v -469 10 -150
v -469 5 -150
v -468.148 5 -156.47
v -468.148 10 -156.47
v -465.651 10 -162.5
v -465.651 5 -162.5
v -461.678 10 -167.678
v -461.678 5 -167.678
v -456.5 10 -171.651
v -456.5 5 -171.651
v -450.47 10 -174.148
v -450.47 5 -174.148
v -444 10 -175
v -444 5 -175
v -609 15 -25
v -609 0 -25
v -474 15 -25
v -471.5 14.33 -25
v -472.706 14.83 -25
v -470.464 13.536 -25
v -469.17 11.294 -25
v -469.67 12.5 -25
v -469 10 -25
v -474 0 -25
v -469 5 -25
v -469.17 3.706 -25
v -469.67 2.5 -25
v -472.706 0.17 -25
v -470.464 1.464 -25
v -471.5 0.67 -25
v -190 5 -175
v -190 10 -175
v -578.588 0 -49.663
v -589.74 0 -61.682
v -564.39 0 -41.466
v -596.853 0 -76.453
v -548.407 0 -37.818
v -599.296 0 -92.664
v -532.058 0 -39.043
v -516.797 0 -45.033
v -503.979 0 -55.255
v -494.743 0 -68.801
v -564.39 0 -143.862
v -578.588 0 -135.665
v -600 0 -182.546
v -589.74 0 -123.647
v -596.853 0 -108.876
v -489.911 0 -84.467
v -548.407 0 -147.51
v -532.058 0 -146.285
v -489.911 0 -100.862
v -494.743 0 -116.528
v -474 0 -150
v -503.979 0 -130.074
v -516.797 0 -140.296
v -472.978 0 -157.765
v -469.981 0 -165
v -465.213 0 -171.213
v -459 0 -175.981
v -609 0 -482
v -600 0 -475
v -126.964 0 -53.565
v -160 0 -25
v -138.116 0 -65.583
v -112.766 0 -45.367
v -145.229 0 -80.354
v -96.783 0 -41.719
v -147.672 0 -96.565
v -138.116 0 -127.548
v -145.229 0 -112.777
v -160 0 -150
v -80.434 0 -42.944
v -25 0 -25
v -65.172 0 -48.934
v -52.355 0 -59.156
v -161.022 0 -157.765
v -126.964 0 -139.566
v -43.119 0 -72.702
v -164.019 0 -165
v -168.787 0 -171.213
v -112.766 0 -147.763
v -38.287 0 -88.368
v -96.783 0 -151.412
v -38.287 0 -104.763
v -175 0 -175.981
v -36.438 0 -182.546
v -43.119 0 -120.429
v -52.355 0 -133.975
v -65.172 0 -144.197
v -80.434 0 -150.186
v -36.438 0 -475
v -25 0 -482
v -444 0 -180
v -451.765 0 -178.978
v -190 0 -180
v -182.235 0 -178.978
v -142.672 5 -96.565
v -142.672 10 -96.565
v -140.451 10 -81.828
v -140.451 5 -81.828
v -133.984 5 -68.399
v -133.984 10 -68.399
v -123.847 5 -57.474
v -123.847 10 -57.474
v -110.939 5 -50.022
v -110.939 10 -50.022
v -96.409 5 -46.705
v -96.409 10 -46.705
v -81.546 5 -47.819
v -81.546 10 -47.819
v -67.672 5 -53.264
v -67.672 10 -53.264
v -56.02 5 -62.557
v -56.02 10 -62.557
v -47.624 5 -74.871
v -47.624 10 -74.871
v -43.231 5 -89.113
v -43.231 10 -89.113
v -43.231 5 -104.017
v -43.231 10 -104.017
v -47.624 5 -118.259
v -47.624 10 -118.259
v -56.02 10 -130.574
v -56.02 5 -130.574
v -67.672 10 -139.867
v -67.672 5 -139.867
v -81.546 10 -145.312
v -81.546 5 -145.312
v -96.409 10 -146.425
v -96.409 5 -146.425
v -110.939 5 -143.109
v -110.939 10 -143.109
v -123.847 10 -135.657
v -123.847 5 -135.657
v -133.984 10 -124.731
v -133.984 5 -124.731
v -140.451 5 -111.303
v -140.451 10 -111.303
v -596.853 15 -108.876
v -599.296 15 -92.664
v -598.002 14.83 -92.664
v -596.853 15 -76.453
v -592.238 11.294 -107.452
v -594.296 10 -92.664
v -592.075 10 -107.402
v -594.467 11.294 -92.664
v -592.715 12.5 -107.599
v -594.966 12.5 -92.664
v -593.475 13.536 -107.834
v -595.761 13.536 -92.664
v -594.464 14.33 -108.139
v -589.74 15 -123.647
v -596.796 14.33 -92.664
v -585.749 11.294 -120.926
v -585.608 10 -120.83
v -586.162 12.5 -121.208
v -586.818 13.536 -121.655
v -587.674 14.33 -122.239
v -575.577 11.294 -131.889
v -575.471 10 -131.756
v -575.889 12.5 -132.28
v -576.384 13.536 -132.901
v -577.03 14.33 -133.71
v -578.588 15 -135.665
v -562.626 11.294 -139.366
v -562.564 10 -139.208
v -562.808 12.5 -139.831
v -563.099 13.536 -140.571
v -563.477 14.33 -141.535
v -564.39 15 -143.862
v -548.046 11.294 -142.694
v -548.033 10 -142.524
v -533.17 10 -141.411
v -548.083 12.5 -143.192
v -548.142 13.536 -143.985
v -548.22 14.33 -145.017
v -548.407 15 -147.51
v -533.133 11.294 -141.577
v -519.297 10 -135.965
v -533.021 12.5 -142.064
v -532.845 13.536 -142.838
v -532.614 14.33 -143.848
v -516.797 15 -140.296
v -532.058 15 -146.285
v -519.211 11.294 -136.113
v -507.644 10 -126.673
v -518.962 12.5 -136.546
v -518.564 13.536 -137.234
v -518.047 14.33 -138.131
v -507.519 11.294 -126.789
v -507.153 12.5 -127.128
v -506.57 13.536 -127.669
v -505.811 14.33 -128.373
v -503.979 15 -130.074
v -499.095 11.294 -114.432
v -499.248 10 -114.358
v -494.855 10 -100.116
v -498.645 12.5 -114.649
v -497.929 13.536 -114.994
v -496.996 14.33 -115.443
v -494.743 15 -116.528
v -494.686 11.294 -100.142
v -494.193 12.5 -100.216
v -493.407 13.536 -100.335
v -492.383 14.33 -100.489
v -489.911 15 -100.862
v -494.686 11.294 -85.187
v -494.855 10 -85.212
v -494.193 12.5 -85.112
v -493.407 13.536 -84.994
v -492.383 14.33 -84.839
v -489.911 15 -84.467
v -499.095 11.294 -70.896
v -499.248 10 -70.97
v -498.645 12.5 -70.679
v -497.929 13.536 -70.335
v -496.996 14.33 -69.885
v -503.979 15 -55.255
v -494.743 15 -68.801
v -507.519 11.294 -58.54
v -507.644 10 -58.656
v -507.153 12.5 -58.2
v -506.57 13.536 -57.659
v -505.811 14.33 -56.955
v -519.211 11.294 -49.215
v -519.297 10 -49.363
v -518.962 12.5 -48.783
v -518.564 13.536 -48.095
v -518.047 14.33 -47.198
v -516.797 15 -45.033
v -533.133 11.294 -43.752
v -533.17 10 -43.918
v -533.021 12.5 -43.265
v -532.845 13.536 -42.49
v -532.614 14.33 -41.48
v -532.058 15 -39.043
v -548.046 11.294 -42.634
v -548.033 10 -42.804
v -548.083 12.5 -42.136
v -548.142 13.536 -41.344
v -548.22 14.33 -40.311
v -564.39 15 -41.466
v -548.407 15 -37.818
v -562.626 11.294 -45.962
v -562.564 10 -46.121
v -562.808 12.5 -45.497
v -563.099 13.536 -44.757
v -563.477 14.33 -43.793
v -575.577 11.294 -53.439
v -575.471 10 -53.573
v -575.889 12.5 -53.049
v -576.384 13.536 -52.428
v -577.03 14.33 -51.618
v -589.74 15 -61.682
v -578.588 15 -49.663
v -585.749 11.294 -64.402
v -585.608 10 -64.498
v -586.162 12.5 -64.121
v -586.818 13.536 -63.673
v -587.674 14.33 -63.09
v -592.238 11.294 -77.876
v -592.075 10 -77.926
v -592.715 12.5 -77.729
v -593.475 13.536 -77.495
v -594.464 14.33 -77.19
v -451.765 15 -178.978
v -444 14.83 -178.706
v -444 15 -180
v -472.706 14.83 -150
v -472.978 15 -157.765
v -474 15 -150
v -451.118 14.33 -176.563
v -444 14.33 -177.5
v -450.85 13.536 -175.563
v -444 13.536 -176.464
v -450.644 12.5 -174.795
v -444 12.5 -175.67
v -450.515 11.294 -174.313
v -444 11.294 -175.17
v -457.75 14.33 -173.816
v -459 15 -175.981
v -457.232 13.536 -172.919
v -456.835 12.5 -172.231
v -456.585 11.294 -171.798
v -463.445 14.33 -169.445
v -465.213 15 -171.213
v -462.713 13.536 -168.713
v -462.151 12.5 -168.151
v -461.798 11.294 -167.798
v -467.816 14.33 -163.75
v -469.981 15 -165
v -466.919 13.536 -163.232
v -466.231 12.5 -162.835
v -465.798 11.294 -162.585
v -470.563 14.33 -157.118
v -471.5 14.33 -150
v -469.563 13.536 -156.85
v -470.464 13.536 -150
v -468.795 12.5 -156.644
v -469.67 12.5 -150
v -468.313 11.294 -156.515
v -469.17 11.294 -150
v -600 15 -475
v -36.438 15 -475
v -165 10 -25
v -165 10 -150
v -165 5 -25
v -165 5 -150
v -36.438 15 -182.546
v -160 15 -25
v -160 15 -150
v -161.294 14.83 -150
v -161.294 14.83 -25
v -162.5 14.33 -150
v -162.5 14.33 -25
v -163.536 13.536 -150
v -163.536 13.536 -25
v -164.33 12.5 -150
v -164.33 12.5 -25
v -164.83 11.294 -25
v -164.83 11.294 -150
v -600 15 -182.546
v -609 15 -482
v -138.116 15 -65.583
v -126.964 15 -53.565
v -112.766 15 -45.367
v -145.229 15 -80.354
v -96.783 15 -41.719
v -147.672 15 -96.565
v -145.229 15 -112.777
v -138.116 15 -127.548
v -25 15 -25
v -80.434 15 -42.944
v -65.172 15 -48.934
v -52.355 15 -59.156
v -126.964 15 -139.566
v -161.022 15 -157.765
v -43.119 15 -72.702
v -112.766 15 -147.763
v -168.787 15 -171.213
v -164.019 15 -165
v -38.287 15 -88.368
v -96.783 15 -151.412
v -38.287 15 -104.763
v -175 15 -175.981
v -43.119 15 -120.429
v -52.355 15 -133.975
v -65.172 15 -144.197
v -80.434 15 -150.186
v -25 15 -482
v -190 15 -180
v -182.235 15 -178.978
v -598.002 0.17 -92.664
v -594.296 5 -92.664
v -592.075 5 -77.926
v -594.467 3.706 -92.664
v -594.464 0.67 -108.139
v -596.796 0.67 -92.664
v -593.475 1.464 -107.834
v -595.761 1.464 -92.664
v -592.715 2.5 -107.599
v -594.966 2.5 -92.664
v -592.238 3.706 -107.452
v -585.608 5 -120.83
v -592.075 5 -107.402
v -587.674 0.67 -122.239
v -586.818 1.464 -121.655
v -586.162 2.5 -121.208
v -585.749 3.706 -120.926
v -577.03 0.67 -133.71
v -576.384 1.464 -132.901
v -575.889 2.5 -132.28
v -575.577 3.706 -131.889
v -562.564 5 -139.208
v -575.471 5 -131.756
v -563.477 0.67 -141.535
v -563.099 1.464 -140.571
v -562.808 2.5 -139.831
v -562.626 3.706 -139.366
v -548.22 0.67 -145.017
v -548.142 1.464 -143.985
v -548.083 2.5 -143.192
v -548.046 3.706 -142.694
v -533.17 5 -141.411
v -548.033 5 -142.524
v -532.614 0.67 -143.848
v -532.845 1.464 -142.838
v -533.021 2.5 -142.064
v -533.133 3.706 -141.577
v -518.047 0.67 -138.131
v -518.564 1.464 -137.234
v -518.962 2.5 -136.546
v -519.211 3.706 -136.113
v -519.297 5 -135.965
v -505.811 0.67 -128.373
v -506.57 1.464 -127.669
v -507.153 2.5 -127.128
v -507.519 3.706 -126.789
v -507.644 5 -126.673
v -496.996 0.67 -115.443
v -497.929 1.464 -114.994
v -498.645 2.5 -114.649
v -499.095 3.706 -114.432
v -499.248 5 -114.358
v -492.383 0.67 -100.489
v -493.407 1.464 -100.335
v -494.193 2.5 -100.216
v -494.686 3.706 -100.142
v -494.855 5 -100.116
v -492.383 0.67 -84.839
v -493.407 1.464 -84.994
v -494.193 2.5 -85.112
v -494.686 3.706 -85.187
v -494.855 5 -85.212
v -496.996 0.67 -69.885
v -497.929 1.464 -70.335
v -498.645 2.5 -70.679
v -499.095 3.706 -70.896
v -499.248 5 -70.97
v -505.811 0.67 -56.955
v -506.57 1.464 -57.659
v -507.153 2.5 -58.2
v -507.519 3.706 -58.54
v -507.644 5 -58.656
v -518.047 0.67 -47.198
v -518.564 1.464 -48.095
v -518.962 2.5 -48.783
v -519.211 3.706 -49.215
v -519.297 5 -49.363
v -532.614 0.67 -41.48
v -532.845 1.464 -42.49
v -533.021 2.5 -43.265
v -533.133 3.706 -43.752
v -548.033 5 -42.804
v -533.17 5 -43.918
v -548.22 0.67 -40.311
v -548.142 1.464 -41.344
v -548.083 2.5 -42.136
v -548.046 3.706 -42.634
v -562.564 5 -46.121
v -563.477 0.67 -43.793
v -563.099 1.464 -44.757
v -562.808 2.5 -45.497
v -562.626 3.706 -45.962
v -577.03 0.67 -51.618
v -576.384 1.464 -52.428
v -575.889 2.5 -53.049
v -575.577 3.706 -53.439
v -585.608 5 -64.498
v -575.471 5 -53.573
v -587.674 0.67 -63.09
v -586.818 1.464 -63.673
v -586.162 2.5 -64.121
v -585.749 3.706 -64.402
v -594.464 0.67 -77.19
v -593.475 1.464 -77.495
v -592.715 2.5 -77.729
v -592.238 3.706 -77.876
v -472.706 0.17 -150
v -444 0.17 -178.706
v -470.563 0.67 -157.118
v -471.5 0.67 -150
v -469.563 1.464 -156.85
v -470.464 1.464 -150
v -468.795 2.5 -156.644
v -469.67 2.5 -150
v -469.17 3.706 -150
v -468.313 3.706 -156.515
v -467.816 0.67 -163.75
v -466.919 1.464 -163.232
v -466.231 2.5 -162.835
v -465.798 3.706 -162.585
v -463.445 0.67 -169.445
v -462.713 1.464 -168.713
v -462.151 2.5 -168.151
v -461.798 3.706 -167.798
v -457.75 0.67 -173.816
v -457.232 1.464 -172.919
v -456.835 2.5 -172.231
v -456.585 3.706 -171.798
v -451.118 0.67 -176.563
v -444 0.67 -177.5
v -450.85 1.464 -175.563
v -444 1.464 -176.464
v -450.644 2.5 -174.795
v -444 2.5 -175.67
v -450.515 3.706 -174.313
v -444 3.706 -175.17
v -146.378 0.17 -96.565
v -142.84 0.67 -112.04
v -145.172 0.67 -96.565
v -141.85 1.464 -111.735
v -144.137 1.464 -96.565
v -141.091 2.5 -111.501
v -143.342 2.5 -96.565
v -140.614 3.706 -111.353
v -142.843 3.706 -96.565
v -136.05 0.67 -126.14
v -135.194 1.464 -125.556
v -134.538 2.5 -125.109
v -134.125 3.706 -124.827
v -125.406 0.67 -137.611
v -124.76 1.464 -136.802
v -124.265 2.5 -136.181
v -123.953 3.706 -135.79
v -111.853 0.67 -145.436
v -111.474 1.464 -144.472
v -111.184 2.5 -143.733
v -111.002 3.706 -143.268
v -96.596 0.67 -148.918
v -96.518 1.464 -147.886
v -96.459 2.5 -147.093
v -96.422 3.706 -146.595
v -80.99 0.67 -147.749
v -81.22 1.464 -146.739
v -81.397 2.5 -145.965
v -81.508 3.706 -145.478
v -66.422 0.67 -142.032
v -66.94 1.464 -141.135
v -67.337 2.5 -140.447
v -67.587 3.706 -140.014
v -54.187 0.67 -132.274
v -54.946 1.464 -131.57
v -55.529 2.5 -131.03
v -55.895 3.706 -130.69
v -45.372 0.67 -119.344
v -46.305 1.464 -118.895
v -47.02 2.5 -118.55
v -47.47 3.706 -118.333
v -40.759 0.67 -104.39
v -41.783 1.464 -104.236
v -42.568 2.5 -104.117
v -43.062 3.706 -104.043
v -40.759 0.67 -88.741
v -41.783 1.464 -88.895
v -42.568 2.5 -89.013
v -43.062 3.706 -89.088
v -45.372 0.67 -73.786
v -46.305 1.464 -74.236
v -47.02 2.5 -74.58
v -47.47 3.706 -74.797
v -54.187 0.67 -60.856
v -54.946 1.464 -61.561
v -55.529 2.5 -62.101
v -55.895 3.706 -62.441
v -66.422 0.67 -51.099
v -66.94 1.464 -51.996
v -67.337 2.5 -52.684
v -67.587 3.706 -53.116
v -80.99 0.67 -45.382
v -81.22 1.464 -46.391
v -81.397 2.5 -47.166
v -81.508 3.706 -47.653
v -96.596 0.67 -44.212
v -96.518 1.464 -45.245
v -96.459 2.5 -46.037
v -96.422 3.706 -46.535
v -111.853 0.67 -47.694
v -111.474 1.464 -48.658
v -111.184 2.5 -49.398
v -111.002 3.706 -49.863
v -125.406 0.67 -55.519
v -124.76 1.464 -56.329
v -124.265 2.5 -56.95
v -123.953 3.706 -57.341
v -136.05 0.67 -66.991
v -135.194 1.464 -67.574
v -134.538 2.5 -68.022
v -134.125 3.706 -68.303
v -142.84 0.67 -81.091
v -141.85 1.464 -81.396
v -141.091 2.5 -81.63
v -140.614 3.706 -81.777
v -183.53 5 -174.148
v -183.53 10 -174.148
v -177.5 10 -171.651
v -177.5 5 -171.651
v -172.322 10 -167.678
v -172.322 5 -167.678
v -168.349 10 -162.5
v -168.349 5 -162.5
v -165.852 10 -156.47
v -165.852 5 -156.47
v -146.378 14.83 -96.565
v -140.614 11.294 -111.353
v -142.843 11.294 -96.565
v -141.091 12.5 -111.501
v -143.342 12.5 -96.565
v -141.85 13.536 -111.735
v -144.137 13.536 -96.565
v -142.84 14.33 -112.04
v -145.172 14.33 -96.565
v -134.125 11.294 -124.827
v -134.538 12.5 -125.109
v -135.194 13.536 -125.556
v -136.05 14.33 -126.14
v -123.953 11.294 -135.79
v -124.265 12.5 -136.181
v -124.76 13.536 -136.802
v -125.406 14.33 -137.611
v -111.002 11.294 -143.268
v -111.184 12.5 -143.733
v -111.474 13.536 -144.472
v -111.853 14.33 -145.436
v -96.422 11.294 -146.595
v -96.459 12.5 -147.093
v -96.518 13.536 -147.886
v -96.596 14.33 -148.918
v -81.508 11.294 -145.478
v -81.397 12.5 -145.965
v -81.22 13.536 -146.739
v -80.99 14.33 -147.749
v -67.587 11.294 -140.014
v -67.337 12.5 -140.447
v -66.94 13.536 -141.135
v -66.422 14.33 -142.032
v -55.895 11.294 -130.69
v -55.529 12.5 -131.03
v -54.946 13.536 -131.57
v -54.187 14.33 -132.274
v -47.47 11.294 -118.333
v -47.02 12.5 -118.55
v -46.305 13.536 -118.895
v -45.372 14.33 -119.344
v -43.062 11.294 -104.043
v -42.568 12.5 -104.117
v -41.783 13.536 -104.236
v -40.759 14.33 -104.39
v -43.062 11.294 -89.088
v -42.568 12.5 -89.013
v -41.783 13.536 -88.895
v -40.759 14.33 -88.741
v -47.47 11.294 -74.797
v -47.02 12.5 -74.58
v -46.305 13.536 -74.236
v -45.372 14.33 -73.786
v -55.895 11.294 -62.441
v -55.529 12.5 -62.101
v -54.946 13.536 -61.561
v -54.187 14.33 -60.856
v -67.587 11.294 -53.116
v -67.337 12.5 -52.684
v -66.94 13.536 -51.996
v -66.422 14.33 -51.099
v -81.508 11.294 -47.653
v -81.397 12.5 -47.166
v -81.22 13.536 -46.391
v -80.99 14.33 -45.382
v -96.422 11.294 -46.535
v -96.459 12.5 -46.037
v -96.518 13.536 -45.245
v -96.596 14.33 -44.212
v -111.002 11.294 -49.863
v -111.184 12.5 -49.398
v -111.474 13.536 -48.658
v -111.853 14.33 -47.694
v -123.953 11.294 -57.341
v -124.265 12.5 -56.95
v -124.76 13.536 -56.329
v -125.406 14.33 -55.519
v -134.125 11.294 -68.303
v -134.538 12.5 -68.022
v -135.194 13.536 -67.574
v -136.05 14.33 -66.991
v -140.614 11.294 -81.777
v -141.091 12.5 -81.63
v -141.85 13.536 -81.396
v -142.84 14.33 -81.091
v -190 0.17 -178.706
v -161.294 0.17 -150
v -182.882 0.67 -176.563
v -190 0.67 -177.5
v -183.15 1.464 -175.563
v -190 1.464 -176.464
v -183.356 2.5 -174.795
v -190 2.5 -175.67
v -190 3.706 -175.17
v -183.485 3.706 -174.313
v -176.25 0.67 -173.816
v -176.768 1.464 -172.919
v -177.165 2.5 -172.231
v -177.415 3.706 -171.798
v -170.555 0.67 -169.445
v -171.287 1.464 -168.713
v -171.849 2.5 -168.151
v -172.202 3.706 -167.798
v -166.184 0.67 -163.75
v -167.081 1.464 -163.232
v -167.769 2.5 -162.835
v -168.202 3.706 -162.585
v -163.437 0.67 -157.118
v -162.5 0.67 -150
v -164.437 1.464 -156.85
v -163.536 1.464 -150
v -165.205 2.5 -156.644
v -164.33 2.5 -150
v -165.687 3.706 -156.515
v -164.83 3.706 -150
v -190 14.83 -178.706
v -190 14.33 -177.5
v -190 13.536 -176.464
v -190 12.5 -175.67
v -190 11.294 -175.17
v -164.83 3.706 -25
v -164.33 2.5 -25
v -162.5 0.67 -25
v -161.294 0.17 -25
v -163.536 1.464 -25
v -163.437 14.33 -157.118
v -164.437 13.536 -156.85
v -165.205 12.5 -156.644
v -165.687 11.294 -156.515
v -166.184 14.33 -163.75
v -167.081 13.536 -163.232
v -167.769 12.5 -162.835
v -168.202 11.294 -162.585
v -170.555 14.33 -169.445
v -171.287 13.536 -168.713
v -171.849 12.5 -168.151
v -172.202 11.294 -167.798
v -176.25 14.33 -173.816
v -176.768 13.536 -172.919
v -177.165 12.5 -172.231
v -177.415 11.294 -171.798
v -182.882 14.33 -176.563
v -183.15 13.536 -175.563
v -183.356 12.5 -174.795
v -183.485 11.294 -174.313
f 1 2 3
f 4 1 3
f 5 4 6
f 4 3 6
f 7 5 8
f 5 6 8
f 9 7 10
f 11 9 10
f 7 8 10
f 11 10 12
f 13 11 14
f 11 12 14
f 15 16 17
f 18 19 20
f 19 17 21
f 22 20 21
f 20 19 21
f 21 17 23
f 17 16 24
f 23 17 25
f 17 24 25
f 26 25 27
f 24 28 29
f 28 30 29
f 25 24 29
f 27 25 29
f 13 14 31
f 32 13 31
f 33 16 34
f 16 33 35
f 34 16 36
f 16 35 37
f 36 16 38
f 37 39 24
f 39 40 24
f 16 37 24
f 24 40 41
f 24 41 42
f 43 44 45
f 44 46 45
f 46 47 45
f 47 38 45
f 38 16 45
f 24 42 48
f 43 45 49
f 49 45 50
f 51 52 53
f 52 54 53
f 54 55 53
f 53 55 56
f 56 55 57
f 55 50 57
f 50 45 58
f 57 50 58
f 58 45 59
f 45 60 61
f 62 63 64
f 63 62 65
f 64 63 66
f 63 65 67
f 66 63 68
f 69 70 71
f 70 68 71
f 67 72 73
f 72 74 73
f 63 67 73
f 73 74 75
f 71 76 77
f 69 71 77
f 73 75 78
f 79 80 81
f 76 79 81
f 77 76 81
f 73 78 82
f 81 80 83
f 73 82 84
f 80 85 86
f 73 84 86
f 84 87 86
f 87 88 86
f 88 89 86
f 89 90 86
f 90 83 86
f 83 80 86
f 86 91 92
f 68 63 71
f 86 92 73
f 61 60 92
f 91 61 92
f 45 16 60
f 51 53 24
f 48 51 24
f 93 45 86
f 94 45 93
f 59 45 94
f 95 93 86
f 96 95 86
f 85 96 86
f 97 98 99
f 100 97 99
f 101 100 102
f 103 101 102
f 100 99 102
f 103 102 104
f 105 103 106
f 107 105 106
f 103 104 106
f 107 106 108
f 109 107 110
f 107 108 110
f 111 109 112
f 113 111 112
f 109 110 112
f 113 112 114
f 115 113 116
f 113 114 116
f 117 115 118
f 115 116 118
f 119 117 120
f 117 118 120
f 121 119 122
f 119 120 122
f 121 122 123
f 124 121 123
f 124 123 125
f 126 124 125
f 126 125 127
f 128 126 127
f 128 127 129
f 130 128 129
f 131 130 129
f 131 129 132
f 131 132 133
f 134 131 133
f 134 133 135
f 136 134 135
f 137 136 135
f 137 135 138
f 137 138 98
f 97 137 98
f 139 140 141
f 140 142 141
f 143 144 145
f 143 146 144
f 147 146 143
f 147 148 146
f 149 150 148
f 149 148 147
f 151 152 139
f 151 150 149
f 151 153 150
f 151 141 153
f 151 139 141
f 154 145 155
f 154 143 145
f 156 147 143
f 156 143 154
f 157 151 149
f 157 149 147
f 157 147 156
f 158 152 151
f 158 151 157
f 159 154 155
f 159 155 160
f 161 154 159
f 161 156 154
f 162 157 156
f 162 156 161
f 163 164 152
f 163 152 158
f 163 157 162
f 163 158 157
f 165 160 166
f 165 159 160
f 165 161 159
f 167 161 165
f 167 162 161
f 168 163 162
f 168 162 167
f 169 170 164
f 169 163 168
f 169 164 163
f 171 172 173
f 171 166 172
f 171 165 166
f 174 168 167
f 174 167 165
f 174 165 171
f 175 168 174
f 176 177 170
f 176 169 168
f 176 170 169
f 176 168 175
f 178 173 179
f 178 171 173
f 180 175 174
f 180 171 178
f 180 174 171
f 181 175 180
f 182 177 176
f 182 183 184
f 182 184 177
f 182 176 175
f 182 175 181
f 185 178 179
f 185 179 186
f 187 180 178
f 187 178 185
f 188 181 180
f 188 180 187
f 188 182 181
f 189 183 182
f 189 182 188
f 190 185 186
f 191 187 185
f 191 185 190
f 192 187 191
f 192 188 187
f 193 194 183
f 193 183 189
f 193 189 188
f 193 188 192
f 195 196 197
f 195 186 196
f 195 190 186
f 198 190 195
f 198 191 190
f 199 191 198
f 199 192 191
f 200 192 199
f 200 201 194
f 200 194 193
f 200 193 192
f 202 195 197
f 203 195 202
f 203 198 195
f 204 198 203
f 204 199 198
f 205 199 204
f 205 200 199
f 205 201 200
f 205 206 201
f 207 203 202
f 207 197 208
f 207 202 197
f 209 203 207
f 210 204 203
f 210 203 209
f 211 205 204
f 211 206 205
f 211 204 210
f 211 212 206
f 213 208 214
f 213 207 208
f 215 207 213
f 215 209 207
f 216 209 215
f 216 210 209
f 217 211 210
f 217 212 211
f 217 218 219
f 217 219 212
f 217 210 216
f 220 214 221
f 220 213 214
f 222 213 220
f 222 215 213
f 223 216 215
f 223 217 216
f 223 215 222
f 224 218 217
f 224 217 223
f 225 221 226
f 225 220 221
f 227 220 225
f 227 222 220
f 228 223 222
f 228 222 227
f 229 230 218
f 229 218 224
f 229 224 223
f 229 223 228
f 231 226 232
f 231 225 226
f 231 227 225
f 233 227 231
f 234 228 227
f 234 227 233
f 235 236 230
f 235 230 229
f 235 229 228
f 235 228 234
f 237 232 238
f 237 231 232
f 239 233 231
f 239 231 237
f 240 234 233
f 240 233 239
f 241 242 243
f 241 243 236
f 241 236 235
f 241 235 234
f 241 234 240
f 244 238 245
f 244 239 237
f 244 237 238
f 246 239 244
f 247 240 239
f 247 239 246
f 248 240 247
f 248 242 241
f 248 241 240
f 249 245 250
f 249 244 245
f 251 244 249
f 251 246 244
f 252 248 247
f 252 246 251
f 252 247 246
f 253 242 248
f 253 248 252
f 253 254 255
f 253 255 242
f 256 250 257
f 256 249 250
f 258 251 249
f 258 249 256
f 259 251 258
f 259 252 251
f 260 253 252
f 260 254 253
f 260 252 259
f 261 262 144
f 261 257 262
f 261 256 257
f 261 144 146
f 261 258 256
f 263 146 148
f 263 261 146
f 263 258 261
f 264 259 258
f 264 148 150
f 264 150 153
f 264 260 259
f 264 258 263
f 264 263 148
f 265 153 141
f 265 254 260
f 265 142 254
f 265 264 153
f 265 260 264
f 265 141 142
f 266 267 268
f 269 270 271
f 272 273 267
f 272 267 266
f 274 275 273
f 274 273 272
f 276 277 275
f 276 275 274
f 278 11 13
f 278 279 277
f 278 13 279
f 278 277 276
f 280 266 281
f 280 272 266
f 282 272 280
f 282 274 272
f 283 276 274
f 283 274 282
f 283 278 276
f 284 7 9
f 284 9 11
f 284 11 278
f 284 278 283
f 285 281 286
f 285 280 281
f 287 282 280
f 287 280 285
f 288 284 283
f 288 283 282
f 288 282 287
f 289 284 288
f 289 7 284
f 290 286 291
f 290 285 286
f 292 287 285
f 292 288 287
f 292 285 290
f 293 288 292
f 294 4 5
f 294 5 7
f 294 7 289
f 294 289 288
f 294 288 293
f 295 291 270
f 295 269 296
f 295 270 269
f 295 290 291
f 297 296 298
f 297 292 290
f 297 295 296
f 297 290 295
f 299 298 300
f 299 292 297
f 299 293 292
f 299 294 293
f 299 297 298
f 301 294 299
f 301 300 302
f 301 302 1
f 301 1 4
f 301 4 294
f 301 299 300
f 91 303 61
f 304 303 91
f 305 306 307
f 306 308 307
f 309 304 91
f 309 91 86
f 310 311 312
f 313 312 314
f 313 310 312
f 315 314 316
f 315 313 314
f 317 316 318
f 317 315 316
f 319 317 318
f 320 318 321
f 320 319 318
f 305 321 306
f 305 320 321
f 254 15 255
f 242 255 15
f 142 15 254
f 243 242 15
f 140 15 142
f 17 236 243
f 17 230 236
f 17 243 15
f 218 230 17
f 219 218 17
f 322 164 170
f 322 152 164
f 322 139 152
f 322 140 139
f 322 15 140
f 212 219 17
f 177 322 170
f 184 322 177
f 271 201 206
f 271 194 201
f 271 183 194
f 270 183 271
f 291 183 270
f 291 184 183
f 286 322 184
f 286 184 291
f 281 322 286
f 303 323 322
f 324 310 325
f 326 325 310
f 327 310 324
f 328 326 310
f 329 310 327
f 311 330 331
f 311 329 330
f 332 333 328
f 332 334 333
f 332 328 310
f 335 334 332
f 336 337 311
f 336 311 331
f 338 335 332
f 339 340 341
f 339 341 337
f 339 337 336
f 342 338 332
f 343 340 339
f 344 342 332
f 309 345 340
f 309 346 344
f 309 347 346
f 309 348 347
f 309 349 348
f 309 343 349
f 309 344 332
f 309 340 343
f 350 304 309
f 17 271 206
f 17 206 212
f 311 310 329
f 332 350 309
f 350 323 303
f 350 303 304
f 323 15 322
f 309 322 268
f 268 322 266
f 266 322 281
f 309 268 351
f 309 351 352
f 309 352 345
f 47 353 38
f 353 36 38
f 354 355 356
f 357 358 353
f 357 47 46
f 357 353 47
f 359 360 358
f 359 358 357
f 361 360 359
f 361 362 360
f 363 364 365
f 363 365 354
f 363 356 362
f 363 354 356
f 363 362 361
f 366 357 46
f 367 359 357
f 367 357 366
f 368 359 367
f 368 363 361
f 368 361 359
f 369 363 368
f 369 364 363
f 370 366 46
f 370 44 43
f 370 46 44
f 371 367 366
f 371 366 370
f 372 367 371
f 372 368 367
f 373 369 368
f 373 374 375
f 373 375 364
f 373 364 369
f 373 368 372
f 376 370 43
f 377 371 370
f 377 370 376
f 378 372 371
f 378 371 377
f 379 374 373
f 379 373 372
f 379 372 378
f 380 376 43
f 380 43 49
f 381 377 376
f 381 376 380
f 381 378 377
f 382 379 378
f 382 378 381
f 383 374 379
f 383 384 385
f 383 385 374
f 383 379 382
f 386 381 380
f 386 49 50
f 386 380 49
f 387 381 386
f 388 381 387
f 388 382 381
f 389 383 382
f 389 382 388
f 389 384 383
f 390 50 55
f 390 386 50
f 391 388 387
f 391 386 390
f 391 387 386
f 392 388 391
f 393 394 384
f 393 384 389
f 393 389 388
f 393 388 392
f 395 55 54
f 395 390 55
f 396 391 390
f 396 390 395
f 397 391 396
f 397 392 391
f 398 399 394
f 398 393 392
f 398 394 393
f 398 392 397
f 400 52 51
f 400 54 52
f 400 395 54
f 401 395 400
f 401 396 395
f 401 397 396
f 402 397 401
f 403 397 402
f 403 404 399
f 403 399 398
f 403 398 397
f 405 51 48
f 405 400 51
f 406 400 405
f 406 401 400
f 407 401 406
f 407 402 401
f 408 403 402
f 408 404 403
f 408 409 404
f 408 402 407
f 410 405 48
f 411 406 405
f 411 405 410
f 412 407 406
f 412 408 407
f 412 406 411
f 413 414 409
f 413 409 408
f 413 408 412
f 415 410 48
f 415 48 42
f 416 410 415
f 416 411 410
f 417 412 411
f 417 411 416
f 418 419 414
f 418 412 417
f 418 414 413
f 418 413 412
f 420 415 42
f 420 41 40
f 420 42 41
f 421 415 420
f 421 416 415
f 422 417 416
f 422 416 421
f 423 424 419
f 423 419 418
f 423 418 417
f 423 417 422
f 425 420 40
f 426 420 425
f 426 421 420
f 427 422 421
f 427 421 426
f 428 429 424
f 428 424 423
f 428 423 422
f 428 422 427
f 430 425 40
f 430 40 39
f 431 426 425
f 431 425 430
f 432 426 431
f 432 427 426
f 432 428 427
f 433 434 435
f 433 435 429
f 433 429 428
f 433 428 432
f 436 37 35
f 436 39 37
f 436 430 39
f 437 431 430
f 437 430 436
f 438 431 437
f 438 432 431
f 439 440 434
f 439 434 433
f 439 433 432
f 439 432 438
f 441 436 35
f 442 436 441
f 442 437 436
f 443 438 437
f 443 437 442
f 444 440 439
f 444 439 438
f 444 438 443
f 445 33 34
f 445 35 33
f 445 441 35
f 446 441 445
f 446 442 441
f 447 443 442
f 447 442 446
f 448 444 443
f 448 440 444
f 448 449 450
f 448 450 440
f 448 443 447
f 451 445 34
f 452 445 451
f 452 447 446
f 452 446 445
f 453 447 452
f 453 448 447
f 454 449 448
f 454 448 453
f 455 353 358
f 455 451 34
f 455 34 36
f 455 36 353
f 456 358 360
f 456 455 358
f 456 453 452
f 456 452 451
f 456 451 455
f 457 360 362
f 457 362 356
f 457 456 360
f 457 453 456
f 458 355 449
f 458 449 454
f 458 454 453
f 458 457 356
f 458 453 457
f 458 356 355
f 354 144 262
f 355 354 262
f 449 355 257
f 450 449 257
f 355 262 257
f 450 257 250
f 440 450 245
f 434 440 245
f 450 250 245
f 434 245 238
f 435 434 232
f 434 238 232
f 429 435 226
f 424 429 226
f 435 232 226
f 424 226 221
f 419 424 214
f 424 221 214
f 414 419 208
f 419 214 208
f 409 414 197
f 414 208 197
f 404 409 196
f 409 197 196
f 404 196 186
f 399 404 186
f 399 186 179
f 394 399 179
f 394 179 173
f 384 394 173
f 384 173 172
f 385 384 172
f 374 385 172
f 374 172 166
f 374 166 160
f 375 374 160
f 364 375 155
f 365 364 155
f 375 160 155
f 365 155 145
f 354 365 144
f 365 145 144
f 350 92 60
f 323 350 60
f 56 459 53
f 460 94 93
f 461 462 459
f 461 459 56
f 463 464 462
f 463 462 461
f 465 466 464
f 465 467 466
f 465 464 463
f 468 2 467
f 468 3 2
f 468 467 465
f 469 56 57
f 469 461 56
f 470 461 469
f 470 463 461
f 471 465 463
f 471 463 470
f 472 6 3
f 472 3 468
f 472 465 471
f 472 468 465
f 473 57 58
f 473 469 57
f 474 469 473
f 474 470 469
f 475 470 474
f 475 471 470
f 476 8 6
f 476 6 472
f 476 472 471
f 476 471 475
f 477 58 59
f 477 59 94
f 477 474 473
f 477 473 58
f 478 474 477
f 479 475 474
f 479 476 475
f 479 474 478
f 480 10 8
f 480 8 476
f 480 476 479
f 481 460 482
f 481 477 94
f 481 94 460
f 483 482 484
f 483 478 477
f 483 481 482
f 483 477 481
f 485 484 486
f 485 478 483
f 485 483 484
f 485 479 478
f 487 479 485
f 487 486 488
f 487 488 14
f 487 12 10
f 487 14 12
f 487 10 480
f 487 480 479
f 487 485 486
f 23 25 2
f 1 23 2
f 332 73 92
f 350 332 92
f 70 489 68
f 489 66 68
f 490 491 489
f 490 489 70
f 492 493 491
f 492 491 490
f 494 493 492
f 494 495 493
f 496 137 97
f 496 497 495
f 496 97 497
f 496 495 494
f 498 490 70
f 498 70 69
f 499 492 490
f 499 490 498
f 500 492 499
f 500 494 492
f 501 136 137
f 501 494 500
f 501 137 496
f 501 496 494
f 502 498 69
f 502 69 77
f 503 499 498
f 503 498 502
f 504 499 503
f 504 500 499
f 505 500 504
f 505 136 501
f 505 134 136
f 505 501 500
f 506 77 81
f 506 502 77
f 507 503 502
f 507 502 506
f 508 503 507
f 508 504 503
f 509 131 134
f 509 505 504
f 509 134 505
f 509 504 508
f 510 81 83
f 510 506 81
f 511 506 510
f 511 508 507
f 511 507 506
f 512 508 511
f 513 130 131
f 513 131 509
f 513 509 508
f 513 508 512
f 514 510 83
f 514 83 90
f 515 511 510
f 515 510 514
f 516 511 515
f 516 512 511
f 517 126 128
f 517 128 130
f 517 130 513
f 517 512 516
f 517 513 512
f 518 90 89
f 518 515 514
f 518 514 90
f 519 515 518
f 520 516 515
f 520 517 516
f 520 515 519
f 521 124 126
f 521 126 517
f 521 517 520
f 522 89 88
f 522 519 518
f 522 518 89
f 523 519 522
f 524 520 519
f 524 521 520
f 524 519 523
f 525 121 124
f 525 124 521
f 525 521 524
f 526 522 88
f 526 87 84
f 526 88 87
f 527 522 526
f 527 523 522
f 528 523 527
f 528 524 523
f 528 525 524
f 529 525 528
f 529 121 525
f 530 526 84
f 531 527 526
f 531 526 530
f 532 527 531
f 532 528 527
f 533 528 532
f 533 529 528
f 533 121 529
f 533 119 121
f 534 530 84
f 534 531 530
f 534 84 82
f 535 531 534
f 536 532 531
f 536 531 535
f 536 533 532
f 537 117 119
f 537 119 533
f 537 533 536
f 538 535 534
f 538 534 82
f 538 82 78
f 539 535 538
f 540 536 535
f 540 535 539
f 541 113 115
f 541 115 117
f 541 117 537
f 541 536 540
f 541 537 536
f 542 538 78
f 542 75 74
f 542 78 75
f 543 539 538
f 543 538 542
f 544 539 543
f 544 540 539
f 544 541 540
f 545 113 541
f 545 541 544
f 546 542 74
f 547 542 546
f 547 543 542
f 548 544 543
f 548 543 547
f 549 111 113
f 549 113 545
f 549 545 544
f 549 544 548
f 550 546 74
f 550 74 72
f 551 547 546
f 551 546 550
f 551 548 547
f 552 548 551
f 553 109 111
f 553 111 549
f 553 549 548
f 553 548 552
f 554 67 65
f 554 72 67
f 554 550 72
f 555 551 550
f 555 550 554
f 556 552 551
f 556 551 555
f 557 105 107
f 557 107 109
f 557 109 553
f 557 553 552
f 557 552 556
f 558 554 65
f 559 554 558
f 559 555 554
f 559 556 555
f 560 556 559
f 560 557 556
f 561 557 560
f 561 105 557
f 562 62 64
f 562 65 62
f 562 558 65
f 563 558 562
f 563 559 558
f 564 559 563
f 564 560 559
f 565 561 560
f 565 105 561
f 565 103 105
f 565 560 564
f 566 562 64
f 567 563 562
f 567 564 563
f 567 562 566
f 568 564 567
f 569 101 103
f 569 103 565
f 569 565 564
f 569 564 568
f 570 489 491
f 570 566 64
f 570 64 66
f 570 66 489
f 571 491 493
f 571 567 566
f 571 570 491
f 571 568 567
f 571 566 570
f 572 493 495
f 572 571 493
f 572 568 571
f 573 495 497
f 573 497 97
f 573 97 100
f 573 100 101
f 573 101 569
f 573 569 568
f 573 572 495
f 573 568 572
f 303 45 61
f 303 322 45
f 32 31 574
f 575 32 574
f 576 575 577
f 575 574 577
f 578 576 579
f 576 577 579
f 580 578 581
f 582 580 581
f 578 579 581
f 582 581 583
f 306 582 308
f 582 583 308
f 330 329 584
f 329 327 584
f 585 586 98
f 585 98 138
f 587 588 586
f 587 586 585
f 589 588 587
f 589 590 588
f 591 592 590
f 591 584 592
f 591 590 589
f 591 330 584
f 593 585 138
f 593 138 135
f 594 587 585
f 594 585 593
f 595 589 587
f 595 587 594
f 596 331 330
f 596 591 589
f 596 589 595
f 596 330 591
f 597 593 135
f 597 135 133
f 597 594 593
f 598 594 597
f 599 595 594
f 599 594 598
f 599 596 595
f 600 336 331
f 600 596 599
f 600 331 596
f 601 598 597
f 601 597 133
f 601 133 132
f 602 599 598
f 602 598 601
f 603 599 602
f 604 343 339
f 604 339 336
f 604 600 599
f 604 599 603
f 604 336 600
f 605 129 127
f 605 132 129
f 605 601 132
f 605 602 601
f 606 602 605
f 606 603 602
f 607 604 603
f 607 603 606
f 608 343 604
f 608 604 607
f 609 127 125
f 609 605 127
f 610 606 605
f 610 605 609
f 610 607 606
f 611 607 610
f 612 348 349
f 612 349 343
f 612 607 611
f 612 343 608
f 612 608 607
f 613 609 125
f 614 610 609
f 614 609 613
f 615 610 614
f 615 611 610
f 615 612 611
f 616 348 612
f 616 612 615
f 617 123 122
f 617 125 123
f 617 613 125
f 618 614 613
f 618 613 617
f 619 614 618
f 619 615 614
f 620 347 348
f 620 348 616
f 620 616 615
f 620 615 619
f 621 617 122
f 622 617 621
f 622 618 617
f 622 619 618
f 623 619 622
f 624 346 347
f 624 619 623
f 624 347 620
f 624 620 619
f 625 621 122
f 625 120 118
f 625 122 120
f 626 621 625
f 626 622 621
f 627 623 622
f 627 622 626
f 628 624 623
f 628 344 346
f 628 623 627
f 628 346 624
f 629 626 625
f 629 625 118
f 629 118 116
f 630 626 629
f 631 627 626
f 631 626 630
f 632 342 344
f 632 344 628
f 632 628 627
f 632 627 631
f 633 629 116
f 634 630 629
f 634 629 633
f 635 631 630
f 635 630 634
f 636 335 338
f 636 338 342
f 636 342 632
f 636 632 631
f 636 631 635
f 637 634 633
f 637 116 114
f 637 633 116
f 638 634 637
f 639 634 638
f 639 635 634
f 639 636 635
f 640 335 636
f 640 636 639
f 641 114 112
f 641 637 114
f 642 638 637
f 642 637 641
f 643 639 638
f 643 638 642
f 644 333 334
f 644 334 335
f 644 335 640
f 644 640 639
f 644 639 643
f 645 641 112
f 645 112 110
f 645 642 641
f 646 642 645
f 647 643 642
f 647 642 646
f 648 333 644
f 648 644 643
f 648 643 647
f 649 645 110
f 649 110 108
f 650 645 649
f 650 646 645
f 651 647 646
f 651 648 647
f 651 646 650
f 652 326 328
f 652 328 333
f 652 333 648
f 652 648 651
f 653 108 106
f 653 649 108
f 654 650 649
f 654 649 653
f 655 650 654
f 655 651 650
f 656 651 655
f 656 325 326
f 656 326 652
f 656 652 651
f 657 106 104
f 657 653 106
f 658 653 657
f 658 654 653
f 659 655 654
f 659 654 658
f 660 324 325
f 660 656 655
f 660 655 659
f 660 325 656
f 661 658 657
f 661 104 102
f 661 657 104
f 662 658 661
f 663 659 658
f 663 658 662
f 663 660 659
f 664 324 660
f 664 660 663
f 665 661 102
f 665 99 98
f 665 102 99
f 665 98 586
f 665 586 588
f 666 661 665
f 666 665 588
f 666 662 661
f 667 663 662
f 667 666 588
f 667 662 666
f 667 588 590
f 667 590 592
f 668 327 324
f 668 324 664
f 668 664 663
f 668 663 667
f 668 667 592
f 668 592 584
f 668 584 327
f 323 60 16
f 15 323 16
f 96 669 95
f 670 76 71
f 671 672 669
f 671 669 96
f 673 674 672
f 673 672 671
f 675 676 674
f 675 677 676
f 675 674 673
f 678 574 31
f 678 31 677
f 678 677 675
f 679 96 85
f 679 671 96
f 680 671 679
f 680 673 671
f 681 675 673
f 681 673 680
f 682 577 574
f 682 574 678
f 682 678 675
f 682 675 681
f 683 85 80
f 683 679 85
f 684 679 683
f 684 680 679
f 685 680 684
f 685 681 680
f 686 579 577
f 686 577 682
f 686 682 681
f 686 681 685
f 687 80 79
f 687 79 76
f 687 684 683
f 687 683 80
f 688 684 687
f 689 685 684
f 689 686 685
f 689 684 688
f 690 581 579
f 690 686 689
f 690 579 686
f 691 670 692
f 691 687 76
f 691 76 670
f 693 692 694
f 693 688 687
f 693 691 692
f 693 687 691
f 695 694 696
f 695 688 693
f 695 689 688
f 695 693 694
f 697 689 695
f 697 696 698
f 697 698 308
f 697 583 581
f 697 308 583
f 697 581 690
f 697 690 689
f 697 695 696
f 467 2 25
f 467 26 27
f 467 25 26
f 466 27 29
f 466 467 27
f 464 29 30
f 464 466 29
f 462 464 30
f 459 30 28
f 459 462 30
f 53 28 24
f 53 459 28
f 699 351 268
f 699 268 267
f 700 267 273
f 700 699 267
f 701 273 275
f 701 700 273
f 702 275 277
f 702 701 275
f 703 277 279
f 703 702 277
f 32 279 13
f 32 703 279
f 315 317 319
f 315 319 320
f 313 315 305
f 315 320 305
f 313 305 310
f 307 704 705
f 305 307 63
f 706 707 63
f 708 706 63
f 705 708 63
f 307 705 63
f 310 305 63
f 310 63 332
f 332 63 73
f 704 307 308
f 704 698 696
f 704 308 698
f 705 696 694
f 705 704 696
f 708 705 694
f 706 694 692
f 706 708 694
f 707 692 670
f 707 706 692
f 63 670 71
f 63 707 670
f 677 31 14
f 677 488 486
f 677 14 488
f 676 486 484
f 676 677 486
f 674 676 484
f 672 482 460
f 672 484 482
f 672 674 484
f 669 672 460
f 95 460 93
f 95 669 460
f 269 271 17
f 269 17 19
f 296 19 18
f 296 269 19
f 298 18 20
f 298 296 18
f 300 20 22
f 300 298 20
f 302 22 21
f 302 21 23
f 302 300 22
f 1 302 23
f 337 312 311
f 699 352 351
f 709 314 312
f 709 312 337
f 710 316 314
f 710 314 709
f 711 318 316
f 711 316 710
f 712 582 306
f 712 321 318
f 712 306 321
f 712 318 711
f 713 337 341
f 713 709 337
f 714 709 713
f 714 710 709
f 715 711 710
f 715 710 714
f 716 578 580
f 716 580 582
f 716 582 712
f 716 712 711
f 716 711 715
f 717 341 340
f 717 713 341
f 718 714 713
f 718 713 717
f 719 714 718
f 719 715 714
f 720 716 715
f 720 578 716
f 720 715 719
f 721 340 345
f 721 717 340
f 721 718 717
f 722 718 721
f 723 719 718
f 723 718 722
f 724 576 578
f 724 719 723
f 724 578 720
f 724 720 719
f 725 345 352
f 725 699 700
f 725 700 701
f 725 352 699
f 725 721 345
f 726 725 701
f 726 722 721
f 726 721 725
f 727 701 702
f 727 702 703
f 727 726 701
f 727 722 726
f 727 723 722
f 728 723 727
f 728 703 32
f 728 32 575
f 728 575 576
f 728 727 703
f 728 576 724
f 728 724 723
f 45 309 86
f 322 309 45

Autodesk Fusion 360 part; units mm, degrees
sketch "Sketch1" plane through (0, 0, 0) normal (0, 1, 0) x (1, 0, 0)
  line L0 (-25, 25) -> (-25, 482)
  line L1 (-25, 482) -> (-609, 482)
  line L2 (-609, 482) -> (-609, 25)
  line L3 (-609, 25) -> (-469, 25)
  line L4 (-444, 175) -> (-190, 175)
  line L5 (-469, 25) -> (-469, 150)
  arc A0 (-444, 175) -> (-469, 150) centre (-444, 150) ccw
  line L6 (-165, 25) -> (-25, 25)
  line L7 (-165, 150) -> (-165, 25)
  arc A1 (-165, 150) -> (-190, 175) centre (-190, 150) ccw
  point P0 (-469, 175)
  point P1 (-165, 175)
  dimension "d1" = 457
  dimension "d2" = 584
  dimension "d3" = 457
  dimension "d5" = 304
  dimension "d7" = 25
  dimension "d8" = 25
extrude "Extrude1" add sketch "Sketch1" along normal blind 15
sketch "Sketch2" plane through (0, 15, 0) normal (0, 1, 0) x (-1, 0, 0)
  line L0 (165, -25) -> (25, -25)
  line L1 (25, -25) -> (25, -482)
  line L2 (25, -482) -> (609, -482)
  line L3 (609, -482) -> (609, -25)
  line L4 (609, -25) -> (469, -25)
  line L5 (469, -25) -> (469, -150)
  arc A0 (444, -175) -> (469, -150) centre (444, -150) ccw
  line L6 (444, -175) -> (190, -175)
  arc A1 (165, -150) -> (190, -175) centre (190, -150) ccw
  line L7 (165, -150) -> (165, -25)
  line L8 (600, -475) -> (36.4384, -475)
  line L9 (36.4384, -475) -> (36.4384, -182.5461)
  line L10 (36.4384, -182.5461) -> (600, -182.5461)
  line L11 (600, -182.5461) -> (600, -475)
  dimension "d11" = 563.5616
extrude "Extrude2" cut sketch "Sketch2" against normal blind 10 contours L8 L9 L10 L11
shell "Shell1" thickness 5 removed faces 1 at (-412.1461, 5, -377.5154)
extrude "Extrude3" cut 1 faces at (-412.1461, 5, -377.5154) along direction (0, -1, 0) blind 5
sketch "Sketch3" plane through (0, 15, 0) normal (0, 1, 0) x (-1, 0, 0)
  line L0 (36.4384, -475) -> (36.4384, -182.5461)
  line L1 (36.4384, -182.5461) -> (600, -182.5461)
  line L2 (600, -182.5461) -> (600, -475)
  line L3 (600, -475) -> (36.4384, -475)
  line L4 (165, -25) -> (25, -25)
  line L5 (25, -25) -> (25, -482)
  line L6 (25, -482) -> (609, -482)
  line L7 (609, -482) -> (609, -25)
  line L8 (609, -25) -> (469, -25)
  line L9 (469, -25) -> (469, -150)
  arc A0 (444, -175) -> (469, -150) centre (444, -150) ccw
  line L10 (444, -175) -> (190, -175)
  arc A1 (165, -150) -> (190, -175) centre (190, -150) ccw
  line L11 (165, -150) -> (165, -25)
  circle A2 centre (544.2965, -92.6642) radius 50
  curve A3
  dimension "d17" = 100
  dimension "d18" = 100
extrude "Extrude4" cut sketch "Sketch3" against normal blind 20 contours A2
sketch "Sketch4" plane through (0, 15, 0) normal (0, 1, 0) x (-1, 0, 0)
  circle A0 centre (544.2965, -92.6642) radius 50
  line L0 (36.4384, -475) -> (36.4384, -182.5461)
  line L1 (36.4384, -182.5461) -> (600, -182.5461)
  line L2 (600, -182.5461) -> (600, -475)
  line L3 (600, -475) -> (36.4384, -475)
  line L4 (165, -25) -> (25, -25)
  line L5 (25, -25) -> (25, -482)
  line L6 (25, -482) -> (609, -482)
  line L7 (609, -482) -> (609, -25)
  line L8 (609, -25) -> (469, -25)
  line L9 (469, -25) -> (469, -150)
  arc A1 (444, -175) -> (469, -150) centre (444, -150) ccw
  line L10 (444, -175) -> (190, -175)
  arc A2 (165, -150) -> (190, -175) centre (190, -150) ccw
  line L11 (165, -150) -> (165, -25)
  circle A3 centre (92.6724, -96.5653) radius 50
  dimension "d23" = 100
extrude "Extrude5" cut sketch "Sketch4" against normal blind 20 contours A3
fillet "Fillet1" radius 5 1 edges at (-46.056, 0, -114.6461)
fillet "Fillet2" radius 5 1 edges at (-46.056, 15, -78.4846)
fillet "Fillet3" radius 5 1 edges at (-497.6801, 0, -110.745)
fillet "Fillet4" radius 5 1 edges at (-497.6801, 15, -74.5834)
fillet "Fillet5" radius 5 5 edges at (-469, 15, -87.5) (-461.6777, 15, -167.6777) (-317, 15, -175) (-172.3223, 15, -167.6777) (-165, 15, -87.5)
fillet "Fillet6" radius 5 5 edges at (-469, 0, -87.5) (-461.6777, 0, -167.6777) (-317, 0, -175) (-172.3223, 0, -167.6777) (-165, 0, -87.5)
